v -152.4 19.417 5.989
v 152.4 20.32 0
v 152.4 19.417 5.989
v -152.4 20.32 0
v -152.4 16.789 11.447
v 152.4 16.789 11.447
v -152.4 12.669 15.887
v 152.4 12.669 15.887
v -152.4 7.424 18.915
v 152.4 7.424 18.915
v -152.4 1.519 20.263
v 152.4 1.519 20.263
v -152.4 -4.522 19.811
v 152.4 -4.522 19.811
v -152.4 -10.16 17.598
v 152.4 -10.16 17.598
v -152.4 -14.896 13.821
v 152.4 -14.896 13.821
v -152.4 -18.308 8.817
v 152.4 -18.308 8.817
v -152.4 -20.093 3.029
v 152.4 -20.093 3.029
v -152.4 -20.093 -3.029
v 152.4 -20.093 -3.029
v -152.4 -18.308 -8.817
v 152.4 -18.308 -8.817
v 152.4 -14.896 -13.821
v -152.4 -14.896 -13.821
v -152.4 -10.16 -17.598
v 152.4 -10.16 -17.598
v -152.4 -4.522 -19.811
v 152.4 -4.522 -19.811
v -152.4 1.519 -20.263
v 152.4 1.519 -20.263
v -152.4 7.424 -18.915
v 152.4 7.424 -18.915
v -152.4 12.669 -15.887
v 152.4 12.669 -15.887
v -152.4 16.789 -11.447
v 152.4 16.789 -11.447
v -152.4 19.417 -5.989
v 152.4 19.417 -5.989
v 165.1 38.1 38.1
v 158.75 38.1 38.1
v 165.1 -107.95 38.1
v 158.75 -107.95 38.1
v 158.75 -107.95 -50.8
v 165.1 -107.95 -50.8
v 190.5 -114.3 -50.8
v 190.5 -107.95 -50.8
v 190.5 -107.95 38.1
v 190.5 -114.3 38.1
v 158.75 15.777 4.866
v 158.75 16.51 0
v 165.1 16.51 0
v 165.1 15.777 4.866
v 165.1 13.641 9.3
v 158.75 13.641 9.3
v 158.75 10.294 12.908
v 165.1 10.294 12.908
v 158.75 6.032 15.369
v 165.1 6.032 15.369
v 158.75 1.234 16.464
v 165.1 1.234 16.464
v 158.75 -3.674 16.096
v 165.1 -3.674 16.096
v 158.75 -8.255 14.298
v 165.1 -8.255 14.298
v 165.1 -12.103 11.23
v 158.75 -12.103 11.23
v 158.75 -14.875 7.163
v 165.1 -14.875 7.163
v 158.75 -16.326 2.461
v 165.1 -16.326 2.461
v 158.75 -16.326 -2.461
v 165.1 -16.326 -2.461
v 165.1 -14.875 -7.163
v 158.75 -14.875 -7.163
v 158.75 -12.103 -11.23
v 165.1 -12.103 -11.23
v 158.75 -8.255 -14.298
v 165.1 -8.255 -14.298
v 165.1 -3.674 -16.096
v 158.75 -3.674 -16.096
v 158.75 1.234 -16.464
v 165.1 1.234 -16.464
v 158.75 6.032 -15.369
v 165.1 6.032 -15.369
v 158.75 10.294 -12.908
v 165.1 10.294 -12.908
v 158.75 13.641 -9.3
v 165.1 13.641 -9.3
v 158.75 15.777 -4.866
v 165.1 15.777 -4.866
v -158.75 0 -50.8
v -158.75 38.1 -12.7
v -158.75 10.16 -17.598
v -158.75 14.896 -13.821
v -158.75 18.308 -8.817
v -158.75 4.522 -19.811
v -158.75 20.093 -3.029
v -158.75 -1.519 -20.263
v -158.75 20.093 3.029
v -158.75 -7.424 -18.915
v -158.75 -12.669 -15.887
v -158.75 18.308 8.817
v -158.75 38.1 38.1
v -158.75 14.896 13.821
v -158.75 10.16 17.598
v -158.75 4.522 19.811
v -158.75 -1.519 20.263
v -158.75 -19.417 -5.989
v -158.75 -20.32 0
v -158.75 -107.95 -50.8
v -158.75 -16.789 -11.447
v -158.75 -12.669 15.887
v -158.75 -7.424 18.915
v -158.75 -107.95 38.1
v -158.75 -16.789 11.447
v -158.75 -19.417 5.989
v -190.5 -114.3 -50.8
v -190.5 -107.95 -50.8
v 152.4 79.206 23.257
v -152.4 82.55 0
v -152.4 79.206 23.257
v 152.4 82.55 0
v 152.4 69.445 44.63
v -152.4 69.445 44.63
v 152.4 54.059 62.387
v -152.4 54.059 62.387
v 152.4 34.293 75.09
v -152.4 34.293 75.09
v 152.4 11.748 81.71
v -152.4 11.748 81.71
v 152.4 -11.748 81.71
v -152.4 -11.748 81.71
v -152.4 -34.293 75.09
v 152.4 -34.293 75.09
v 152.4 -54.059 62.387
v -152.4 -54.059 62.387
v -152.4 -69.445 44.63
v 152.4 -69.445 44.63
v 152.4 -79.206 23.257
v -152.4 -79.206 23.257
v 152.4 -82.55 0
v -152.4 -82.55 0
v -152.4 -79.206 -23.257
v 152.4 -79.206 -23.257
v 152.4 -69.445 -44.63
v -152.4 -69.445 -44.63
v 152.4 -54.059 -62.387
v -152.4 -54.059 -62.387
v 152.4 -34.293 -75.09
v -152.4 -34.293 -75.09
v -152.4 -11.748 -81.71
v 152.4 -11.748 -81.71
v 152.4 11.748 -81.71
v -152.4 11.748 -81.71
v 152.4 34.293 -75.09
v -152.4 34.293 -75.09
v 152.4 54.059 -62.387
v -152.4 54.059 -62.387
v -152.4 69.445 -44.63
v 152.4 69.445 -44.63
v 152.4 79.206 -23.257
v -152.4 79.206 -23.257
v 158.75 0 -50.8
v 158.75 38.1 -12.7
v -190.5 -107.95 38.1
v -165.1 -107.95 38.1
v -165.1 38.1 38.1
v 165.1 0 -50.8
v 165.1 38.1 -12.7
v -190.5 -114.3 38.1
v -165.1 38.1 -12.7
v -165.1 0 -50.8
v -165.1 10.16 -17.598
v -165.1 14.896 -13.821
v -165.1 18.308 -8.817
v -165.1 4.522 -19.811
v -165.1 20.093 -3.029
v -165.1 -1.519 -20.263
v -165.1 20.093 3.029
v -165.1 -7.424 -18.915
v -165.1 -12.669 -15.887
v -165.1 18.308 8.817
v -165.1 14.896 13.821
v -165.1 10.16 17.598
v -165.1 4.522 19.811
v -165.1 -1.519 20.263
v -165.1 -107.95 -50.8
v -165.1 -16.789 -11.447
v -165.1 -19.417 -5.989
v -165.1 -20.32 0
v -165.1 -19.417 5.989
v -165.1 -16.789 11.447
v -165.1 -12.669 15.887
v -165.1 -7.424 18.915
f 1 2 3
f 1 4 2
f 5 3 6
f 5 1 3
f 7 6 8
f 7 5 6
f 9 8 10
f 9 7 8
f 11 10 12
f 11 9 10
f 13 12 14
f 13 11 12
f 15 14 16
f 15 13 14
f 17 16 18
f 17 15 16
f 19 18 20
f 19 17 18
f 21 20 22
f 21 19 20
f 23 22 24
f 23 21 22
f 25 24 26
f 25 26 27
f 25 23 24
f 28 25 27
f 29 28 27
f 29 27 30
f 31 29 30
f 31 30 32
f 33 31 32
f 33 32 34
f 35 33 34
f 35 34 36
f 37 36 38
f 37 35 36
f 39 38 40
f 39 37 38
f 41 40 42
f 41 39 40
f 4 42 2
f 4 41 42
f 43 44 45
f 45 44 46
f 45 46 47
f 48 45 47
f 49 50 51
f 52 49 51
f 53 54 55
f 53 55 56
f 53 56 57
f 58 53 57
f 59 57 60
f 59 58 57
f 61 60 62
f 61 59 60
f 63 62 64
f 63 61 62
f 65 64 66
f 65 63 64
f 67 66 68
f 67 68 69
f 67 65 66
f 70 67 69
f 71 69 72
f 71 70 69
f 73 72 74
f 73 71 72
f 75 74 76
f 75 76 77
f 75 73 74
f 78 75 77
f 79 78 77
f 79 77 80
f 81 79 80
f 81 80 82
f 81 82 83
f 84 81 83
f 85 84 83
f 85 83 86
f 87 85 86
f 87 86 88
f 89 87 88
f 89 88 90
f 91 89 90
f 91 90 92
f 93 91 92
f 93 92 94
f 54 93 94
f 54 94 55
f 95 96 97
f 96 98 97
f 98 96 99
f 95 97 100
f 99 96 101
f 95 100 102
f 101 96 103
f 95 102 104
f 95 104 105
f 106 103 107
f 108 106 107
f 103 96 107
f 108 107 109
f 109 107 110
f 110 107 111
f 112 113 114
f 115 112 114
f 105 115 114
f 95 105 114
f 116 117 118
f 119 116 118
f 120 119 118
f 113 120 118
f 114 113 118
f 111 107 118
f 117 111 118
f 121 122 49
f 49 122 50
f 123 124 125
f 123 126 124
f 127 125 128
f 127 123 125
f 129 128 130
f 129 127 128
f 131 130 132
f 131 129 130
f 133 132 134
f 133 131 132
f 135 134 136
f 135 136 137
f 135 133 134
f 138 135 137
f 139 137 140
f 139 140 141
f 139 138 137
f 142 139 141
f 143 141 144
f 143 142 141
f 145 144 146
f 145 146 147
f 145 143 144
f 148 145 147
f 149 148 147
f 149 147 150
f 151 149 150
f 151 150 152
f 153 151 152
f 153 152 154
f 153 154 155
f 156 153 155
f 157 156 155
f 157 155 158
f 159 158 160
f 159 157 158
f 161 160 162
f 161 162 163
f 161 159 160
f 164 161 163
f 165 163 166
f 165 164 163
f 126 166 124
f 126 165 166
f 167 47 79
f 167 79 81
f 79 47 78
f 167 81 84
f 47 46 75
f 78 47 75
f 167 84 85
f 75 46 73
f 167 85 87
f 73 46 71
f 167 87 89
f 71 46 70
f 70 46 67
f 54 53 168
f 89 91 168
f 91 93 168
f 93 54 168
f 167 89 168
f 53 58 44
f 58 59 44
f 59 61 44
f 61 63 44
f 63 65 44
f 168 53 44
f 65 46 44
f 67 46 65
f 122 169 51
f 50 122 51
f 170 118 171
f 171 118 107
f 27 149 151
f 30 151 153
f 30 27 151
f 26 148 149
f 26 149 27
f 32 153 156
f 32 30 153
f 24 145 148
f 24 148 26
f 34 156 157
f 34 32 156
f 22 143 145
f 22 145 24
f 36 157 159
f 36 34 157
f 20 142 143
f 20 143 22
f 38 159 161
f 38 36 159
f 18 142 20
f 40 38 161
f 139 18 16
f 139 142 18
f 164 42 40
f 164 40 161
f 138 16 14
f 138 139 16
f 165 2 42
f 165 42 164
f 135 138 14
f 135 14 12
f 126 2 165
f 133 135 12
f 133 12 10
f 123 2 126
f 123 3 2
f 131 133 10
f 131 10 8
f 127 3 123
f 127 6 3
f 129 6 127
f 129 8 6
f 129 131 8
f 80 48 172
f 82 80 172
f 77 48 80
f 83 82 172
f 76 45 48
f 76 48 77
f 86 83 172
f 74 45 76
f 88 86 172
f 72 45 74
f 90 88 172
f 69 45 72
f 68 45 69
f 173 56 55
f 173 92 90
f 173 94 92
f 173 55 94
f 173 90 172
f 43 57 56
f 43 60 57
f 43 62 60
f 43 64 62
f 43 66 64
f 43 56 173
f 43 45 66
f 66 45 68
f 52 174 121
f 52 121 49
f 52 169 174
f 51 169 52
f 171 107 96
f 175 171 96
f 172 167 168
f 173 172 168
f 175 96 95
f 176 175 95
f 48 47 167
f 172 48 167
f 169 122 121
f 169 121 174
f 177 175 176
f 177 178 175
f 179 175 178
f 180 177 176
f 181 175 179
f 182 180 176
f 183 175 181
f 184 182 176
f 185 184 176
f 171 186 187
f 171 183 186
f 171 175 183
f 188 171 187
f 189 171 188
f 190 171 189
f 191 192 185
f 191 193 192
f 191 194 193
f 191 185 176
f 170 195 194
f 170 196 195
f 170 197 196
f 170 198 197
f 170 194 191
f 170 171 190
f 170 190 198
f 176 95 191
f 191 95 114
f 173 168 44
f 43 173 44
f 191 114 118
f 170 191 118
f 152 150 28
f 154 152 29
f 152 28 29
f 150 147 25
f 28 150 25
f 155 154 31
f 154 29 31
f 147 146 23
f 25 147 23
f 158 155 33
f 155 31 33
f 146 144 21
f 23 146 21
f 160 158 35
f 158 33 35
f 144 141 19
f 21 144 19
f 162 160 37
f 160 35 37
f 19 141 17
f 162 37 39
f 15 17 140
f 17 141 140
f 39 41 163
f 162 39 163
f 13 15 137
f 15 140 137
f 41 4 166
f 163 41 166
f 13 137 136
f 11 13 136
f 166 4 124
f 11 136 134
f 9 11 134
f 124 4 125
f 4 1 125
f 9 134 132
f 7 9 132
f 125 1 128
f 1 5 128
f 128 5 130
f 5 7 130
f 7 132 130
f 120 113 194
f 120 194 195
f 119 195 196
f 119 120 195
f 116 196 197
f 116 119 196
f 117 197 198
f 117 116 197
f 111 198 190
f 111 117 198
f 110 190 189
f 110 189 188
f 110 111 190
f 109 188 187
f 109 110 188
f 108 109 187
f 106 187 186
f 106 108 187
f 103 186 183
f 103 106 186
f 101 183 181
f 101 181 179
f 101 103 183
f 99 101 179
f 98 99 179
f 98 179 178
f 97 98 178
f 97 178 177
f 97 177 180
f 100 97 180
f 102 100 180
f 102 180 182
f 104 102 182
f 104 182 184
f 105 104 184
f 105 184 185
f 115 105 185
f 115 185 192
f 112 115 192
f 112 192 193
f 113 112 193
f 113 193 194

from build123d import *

# Parameters (mm, degrees)
F0_R     = 82.55
F0_R_2   = 20.32
F1_DEPTH = 152.4
F2_R     = 16.51
F3_DEPTH = 12.7
F4_R     = 20.32
F5_DEPTH = 12.7
F6_DEPTH = 6.35
F4_R_2   = 16.51
F7_DEPTH = 6.35
F8_W     = 381
F8_H     = 88.9
F9_DEPTH = 6.35


with BuildPart() as f1:
    # F0 (on Right) → F1 (new body, symmetric)
    with BuildSketch(Plane.YZ):
        Circle(F0_R)
        Circle(F0_R_2, mode=Mode.SUBTRACT)
    extrude(amount=F1_DEPTH, both=True)


with BuildPart() as f3:
    # F2 (on face) → F3 (new body)
    with BuildSketch(Plane.YZ.offset(152.4)):
        Polygon((38.1, 38.1), (-107.95, 38.1), (-107.95, -50.8), (0, -50.8), (38.1, -12.7), align=None)
        Circle(F2_R, mode=Mode.SUBTRACT)
    extrude(amount=F3_DEPTH)

    # F2 (on face) → F6 (cut)
    with BuildSketch(Plane.YZ.offset(152.4)):
        Polygon((38.1, 38.1), (-107.95, 38.1), (-107.95, -50.8), (0, -50.8), (38.1, -12.7), align=None)
        Circle(F2_R, mode=Mode.SUBTRACT)
    extrude(amount=F6_DEPTH, mode=Mode.SUBTRACT)


with BuildPart() as f5:
    # F4 (on face) → F5 (new body)
    with BuildSketch(Plane(origin=(-152.4, 0, 0), x_dir=(0, -1, 0), z_dir=(-1, 0, 0))):
        with BuildLine():
            Line((-38.1, -12.7), (0, -50.8))
            Line((0, -50.8), (65.068137, -50.8))
            ThreePointArc((65.068137, -50.8), (78.057278, -26.861941), (82.55, 0))
            ThreePointArc((82.55, 0), (80.186611, 19.611472), (73.231772, 38.1))
            Line((73.231772, 38.1), (-38.1, 38.1))
            Line((-38.1, 38.1), (-38.1, -12.7))
        make_face()
        Circle(F4_R, mode=Mode.SUBTRACT)
        with BuildLine():
            ThreePointArc((82.55, 0), (78.057278, -26.861941), (65.068137, -50.8))
            Line((65.068137, -50.8), (107.95, -50.8))
            Line((107.95, -50.8), (107.95, 38.1))
            Line((107.95, 38.1), (73.231772, 38.1))
            ThreePointArc((73.231772, 38.1), (80.186611, 19.611472), (82.55, 0))
        make_face()
    extrude(amount=F5_DEPTH)

    # F4 (on face) → F7 (cut)
    with BuildSketch(Plane(origin=(-152.4, 0, 0), x_dir=(0, -1, 0), z_dir=(-1, 0, 0))):
        Polygon((-38.1, -12.7), (0, -50.8), (107.95, -50.8), (107.95, 38.1), (-38.1, 38.1), align=None)
        Circle(F4_R_2, mode=Mode.SUBTRACT)
    extrude(amount=F7_DEPTH, mode=Mode.SUBTRACT)


with BuildPart() as f9:
    # F8 (on face) → F9 (new body)
    with BuildSketch(Plane.XZ.offset(107.95)):
        with Locations((0, -6.35)):
            Rectangle(F8_W, F8_H)
    extrude(amount=F9_DEPTH)


solid = Compound([f1.part, f3.part, f5.part, f9.part])
